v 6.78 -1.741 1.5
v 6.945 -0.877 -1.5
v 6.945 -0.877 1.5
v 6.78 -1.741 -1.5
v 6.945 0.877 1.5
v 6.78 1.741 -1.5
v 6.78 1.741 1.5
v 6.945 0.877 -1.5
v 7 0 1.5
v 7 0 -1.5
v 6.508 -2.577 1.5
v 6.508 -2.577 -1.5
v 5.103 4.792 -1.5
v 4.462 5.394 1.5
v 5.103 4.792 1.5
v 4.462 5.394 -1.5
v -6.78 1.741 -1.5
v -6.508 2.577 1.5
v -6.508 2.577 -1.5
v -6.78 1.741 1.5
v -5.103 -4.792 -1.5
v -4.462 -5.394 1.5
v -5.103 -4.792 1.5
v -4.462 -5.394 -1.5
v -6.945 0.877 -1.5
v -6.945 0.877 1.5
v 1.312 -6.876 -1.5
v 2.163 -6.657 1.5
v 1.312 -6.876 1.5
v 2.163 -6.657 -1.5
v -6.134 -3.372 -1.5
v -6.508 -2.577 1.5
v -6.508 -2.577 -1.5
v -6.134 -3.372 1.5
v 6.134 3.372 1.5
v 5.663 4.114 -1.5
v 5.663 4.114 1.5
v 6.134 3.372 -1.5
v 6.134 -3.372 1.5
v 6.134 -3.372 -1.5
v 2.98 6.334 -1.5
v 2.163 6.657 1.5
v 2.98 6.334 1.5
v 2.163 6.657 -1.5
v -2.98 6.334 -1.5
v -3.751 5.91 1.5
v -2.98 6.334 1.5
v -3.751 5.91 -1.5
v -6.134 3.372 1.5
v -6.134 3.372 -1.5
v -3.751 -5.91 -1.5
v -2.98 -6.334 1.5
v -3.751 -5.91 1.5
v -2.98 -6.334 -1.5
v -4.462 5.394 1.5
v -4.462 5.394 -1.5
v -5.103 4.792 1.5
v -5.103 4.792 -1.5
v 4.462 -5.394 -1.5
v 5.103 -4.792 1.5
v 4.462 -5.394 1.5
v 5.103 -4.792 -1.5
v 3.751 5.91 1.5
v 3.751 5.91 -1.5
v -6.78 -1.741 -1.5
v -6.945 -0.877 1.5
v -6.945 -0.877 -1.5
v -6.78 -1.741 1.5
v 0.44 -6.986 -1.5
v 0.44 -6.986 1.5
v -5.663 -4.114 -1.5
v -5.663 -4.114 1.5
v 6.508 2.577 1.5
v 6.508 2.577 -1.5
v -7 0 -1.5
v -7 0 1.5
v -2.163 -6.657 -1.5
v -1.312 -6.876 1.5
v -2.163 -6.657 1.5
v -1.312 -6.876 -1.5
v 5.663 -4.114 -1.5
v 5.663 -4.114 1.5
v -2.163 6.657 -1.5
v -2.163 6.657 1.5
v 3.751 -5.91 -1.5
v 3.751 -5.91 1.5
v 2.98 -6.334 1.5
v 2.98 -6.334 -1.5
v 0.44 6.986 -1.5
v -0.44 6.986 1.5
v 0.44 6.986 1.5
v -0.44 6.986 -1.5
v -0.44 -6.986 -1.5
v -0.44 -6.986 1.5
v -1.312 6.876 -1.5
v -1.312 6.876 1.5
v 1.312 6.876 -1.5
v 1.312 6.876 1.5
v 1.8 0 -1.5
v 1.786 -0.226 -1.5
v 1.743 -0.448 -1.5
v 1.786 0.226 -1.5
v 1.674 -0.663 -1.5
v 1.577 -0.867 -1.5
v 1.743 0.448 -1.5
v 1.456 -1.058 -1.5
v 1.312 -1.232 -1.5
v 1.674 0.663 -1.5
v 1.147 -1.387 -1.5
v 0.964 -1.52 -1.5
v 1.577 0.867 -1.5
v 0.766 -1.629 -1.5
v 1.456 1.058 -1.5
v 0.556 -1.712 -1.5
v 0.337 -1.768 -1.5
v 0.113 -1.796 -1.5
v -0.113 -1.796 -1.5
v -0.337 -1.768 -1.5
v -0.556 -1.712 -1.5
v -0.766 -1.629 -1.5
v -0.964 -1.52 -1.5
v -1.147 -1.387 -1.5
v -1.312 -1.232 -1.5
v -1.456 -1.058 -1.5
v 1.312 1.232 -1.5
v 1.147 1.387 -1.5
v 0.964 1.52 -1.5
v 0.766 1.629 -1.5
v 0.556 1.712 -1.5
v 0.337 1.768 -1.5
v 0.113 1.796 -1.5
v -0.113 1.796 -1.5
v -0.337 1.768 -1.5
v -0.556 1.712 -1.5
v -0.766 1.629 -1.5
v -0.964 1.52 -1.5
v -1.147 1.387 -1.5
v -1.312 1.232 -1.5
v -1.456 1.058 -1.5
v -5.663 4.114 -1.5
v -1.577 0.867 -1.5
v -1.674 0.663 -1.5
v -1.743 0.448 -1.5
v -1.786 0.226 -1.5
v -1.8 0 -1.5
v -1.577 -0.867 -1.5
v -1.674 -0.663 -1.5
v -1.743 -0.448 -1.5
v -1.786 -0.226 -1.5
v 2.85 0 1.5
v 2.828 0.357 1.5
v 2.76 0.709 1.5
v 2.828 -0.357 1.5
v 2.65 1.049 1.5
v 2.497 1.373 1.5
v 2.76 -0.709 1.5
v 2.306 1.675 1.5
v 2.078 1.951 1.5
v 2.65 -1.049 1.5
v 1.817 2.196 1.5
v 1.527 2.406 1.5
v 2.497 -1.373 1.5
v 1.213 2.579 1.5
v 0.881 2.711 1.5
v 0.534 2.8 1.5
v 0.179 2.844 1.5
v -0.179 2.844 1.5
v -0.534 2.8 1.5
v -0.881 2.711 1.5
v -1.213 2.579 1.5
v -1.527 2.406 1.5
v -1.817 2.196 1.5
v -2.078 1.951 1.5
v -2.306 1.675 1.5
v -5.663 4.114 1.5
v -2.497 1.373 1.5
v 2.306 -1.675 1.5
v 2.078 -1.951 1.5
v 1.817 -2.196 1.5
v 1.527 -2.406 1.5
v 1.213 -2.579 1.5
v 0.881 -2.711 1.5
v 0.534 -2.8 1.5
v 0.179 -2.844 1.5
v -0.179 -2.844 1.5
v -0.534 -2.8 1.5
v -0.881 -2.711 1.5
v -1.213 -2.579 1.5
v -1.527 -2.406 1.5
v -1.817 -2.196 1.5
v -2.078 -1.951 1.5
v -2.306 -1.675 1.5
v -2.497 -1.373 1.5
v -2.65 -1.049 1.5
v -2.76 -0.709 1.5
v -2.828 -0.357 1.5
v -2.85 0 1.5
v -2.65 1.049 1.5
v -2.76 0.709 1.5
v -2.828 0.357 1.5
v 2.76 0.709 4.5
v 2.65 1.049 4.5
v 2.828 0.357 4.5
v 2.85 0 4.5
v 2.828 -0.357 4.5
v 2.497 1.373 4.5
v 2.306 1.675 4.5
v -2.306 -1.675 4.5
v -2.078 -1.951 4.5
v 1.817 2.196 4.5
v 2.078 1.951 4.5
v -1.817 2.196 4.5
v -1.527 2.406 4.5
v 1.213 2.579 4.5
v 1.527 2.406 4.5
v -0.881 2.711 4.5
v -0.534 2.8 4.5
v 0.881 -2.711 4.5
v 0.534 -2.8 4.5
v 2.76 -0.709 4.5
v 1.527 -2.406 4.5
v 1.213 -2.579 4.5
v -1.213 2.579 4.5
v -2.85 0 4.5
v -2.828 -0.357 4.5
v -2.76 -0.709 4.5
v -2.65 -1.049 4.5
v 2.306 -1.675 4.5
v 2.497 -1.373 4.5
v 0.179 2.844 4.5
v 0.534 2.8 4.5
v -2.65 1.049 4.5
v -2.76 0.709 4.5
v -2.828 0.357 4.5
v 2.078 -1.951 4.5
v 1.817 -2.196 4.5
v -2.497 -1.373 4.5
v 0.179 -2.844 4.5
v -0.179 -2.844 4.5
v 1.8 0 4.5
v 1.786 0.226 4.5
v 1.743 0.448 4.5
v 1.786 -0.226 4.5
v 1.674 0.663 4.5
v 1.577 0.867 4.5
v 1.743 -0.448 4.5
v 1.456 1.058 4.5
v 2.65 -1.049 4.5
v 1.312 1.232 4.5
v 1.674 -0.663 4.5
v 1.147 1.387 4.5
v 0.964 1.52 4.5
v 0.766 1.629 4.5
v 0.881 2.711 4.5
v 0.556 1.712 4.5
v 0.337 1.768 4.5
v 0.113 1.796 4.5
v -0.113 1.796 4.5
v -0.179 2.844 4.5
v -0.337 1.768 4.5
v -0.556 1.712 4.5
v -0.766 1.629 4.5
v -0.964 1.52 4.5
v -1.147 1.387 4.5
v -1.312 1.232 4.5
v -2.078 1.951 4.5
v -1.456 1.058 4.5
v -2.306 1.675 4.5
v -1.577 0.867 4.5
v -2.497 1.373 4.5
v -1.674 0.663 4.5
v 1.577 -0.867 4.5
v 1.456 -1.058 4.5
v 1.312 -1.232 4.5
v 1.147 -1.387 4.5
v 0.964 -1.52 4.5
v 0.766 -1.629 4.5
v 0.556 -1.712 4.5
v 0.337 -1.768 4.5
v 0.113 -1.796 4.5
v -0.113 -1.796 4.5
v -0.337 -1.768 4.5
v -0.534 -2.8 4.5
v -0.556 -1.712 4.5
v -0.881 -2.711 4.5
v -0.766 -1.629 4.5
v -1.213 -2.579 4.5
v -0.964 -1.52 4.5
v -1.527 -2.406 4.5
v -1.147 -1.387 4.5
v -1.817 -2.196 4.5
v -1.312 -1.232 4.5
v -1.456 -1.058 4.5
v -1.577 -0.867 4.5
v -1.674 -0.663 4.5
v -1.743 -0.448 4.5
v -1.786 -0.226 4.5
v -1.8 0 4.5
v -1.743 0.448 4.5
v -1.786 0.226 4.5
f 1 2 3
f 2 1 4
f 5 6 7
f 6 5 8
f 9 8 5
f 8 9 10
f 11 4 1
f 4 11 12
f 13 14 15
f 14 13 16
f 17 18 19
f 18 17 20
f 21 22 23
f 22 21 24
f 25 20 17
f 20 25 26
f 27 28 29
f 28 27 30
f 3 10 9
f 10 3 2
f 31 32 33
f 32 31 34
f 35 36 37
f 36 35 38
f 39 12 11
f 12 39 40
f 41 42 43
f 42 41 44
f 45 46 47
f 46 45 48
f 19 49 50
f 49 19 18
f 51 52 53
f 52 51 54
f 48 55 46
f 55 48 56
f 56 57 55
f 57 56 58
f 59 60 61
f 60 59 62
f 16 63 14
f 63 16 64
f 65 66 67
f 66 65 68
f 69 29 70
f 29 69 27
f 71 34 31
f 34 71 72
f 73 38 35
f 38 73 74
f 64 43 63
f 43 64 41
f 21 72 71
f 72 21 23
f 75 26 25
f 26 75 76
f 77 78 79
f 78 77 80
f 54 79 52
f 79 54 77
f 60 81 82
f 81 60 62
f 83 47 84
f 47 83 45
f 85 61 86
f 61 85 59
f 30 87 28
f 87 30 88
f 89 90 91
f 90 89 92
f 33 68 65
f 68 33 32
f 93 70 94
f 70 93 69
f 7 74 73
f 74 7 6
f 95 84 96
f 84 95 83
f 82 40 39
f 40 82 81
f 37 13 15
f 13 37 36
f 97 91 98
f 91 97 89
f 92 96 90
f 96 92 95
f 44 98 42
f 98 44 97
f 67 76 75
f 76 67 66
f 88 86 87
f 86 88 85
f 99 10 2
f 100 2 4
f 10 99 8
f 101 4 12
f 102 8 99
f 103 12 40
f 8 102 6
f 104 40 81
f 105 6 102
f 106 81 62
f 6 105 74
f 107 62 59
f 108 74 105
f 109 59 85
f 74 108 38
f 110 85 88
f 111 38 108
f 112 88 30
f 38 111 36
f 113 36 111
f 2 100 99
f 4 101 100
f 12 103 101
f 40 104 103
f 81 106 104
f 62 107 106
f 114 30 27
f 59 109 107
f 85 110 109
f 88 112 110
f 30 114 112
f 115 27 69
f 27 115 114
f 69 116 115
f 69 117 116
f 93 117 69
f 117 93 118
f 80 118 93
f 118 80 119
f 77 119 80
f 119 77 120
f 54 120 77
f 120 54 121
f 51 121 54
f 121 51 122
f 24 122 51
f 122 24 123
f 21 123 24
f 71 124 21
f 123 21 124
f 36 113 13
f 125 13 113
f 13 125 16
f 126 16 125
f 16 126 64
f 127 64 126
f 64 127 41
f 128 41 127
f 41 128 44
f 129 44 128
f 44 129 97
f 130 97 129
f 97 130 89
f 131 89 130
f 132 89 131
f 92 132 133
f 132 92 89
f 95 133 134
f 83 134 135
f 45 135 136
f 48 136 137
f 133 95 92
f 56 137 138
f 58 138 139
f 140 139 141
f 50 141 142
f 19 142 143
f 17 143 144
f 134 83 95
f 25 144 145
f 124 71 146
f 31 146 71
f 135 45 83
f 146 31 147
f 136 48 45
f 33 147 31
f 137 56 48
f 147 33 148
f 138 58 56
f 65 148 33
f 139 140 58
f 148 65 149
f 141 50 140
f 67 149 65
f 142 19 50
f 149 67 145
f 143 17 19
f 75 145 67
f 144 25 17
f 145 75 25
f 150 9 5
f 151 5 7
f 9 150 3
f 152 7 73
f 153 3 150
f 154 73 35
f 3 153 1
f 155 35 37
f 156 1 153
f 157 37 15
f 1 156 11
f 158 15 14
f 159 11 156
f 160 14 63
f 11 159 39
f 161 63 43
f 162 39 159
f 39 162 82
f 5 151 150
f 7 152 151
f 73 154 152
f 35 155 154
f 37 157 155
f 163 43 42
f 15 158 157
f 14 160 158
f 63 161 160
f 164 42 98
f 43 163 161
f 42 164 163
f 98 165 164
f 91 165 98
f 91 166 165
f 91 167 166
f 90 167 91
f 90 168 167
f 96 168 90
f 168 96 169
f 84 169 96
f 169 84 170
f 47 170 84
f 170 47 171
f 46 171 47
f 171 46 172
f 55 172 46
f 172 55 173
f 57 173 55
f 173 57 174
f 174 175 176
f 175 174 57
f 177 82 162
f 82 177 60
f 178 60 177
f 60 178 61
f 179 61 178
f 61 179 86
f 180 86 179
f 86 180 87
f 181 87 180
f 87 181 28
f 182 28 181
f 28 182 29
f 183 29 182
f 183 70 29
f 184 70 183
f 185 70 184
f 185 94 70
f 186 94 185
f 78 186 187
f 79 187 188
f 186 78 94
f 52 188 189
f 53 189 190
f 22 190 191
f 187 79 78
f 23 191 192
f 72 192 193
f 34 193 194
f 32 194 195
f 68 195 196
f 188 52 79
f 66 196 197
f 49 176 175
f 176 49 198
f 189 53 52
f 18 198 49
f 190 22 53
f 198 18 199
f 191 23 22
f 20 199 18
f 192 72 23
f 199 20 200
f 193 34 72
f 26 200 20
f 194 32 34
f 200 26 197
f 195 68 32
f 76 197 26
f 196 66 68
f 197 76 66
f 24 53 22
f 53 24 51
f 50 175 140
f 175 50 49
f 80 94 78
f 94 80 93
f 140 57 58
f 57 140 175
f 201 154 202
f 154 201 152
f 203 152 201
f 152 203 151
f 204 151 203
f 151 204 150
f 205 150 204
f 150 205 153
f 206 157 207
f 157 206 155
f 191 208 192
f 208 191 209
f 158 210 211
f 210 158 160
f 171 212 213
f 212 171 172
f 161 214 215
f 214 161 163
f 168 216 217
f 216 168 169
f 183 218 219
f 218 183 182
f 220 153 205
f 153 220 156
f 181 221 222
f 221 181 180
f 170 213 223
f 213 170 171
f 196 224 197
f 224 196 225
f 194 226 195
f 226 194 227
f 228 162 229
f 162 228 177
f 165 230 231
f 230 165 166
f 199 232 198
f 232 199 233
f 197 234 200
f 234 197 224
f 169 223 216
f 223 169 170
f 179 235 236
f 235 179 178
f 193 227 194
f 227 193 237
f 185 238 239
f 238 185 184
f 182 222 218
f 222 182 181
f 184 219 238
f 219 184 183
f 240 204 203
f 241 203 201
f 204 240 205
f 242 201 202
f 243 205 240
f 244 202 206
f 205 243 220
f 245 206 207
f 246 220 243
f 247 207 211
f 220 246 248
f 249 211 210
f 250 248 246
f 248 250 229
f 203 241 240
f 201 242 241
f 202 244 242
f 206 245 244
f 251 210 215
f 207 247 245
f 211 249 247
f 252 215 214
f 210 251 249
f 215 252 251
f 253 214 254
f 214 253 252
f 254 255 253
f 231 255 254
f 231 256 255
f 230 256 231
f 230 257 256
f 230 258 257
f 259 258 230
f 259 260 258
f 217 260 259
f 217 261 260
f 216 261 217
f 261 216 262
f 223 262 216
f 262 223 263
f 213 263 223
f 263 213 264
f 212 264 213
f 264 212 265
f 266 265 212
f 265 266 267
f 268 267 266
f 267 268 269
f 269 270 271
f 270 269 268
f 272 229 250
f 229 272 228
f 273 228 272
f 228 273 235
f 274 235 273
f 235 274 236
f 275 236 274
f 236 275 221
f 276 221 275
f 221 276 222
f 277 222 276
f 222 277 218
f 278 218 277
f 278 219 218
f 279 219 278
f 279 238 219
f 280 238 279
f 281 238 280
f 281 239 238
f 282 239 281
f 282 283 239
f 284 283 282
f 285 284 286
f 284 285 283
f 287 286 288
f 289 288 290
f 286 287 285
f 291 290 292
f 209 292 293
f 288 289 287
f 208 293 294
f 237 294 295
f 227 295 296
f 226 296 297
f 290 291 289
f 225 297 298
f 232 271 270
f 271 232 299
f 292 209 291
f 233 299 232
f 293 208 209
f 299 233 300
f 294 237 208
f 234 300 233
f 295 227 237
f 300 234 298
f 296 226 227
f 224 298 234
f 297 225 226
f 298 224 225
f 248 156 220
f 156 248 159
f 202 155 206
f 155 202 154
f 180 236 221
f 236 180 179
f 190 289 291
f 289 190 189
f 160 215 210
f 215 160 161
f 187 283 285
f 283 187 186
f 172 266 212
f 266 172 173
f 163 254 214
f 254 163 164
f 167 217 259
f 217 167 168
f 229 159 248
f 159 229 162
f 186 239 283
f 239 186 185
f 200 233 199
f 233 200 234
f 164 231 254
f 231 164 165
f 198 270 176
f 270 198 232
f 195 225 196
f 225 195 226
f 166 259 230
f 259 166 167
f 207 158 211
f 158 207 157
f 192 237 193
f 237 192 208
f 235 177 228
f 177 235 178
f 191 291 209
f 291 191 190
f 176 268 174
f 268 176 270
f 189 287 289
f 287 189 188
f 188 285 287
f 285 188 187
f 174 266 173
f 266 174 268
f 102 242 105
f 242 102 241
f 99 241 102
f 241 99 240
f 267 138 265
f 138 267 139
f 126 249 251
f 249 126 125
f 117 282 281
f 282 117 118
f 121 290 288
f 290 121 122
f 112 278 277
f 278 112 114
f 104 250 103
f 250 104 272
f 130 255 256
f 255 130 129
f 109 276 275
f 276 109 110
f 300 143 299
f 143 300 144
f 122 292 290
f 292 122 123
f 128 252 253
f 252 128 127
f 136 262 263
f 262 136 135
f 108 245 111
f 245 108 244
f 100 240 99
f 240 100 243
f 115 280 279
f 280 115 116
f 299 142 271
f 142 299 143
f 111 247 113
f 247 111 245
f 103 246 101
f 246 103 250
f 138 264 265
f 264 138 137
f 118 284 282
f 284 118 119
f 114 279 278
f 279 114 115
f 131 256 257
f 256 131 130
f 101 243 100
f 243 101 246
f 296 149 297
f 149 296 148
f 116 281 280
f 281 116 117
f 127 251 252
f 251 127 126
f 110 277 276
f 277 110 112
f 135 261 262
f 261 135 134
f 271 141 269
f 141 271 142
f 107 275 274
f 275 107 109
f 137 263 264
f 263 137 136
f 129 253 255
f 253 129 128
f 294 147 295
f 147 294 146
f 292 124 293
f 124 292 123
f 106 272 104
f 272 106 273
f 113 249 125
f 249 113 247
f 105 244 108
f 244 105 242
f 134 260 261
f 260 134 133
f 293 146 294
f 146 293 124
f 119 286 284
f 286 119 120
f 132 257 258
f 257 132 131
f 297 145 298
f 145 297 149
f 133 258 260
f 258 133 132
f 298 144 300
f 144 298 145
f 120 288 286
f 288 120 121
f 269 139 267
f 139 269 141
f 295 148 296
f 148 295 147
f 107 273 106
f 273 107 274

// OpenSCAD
$fn = 50;


difference() {
	union() {
		translate(v = [0, 0, -1.5000000000]) {
			cylinder(h = 3, r = 7.0000000000);
		}
		translate(v = [0, 0, -1.5000000000]) {
			cylinder(h = 6, r = 2.8500000000);
		}
	}
	union() {
		translate(v = [0, 0, -50.0000000000]) {
			cylinder(h = 100, r = 1.8000000000);
		}
	}
}
